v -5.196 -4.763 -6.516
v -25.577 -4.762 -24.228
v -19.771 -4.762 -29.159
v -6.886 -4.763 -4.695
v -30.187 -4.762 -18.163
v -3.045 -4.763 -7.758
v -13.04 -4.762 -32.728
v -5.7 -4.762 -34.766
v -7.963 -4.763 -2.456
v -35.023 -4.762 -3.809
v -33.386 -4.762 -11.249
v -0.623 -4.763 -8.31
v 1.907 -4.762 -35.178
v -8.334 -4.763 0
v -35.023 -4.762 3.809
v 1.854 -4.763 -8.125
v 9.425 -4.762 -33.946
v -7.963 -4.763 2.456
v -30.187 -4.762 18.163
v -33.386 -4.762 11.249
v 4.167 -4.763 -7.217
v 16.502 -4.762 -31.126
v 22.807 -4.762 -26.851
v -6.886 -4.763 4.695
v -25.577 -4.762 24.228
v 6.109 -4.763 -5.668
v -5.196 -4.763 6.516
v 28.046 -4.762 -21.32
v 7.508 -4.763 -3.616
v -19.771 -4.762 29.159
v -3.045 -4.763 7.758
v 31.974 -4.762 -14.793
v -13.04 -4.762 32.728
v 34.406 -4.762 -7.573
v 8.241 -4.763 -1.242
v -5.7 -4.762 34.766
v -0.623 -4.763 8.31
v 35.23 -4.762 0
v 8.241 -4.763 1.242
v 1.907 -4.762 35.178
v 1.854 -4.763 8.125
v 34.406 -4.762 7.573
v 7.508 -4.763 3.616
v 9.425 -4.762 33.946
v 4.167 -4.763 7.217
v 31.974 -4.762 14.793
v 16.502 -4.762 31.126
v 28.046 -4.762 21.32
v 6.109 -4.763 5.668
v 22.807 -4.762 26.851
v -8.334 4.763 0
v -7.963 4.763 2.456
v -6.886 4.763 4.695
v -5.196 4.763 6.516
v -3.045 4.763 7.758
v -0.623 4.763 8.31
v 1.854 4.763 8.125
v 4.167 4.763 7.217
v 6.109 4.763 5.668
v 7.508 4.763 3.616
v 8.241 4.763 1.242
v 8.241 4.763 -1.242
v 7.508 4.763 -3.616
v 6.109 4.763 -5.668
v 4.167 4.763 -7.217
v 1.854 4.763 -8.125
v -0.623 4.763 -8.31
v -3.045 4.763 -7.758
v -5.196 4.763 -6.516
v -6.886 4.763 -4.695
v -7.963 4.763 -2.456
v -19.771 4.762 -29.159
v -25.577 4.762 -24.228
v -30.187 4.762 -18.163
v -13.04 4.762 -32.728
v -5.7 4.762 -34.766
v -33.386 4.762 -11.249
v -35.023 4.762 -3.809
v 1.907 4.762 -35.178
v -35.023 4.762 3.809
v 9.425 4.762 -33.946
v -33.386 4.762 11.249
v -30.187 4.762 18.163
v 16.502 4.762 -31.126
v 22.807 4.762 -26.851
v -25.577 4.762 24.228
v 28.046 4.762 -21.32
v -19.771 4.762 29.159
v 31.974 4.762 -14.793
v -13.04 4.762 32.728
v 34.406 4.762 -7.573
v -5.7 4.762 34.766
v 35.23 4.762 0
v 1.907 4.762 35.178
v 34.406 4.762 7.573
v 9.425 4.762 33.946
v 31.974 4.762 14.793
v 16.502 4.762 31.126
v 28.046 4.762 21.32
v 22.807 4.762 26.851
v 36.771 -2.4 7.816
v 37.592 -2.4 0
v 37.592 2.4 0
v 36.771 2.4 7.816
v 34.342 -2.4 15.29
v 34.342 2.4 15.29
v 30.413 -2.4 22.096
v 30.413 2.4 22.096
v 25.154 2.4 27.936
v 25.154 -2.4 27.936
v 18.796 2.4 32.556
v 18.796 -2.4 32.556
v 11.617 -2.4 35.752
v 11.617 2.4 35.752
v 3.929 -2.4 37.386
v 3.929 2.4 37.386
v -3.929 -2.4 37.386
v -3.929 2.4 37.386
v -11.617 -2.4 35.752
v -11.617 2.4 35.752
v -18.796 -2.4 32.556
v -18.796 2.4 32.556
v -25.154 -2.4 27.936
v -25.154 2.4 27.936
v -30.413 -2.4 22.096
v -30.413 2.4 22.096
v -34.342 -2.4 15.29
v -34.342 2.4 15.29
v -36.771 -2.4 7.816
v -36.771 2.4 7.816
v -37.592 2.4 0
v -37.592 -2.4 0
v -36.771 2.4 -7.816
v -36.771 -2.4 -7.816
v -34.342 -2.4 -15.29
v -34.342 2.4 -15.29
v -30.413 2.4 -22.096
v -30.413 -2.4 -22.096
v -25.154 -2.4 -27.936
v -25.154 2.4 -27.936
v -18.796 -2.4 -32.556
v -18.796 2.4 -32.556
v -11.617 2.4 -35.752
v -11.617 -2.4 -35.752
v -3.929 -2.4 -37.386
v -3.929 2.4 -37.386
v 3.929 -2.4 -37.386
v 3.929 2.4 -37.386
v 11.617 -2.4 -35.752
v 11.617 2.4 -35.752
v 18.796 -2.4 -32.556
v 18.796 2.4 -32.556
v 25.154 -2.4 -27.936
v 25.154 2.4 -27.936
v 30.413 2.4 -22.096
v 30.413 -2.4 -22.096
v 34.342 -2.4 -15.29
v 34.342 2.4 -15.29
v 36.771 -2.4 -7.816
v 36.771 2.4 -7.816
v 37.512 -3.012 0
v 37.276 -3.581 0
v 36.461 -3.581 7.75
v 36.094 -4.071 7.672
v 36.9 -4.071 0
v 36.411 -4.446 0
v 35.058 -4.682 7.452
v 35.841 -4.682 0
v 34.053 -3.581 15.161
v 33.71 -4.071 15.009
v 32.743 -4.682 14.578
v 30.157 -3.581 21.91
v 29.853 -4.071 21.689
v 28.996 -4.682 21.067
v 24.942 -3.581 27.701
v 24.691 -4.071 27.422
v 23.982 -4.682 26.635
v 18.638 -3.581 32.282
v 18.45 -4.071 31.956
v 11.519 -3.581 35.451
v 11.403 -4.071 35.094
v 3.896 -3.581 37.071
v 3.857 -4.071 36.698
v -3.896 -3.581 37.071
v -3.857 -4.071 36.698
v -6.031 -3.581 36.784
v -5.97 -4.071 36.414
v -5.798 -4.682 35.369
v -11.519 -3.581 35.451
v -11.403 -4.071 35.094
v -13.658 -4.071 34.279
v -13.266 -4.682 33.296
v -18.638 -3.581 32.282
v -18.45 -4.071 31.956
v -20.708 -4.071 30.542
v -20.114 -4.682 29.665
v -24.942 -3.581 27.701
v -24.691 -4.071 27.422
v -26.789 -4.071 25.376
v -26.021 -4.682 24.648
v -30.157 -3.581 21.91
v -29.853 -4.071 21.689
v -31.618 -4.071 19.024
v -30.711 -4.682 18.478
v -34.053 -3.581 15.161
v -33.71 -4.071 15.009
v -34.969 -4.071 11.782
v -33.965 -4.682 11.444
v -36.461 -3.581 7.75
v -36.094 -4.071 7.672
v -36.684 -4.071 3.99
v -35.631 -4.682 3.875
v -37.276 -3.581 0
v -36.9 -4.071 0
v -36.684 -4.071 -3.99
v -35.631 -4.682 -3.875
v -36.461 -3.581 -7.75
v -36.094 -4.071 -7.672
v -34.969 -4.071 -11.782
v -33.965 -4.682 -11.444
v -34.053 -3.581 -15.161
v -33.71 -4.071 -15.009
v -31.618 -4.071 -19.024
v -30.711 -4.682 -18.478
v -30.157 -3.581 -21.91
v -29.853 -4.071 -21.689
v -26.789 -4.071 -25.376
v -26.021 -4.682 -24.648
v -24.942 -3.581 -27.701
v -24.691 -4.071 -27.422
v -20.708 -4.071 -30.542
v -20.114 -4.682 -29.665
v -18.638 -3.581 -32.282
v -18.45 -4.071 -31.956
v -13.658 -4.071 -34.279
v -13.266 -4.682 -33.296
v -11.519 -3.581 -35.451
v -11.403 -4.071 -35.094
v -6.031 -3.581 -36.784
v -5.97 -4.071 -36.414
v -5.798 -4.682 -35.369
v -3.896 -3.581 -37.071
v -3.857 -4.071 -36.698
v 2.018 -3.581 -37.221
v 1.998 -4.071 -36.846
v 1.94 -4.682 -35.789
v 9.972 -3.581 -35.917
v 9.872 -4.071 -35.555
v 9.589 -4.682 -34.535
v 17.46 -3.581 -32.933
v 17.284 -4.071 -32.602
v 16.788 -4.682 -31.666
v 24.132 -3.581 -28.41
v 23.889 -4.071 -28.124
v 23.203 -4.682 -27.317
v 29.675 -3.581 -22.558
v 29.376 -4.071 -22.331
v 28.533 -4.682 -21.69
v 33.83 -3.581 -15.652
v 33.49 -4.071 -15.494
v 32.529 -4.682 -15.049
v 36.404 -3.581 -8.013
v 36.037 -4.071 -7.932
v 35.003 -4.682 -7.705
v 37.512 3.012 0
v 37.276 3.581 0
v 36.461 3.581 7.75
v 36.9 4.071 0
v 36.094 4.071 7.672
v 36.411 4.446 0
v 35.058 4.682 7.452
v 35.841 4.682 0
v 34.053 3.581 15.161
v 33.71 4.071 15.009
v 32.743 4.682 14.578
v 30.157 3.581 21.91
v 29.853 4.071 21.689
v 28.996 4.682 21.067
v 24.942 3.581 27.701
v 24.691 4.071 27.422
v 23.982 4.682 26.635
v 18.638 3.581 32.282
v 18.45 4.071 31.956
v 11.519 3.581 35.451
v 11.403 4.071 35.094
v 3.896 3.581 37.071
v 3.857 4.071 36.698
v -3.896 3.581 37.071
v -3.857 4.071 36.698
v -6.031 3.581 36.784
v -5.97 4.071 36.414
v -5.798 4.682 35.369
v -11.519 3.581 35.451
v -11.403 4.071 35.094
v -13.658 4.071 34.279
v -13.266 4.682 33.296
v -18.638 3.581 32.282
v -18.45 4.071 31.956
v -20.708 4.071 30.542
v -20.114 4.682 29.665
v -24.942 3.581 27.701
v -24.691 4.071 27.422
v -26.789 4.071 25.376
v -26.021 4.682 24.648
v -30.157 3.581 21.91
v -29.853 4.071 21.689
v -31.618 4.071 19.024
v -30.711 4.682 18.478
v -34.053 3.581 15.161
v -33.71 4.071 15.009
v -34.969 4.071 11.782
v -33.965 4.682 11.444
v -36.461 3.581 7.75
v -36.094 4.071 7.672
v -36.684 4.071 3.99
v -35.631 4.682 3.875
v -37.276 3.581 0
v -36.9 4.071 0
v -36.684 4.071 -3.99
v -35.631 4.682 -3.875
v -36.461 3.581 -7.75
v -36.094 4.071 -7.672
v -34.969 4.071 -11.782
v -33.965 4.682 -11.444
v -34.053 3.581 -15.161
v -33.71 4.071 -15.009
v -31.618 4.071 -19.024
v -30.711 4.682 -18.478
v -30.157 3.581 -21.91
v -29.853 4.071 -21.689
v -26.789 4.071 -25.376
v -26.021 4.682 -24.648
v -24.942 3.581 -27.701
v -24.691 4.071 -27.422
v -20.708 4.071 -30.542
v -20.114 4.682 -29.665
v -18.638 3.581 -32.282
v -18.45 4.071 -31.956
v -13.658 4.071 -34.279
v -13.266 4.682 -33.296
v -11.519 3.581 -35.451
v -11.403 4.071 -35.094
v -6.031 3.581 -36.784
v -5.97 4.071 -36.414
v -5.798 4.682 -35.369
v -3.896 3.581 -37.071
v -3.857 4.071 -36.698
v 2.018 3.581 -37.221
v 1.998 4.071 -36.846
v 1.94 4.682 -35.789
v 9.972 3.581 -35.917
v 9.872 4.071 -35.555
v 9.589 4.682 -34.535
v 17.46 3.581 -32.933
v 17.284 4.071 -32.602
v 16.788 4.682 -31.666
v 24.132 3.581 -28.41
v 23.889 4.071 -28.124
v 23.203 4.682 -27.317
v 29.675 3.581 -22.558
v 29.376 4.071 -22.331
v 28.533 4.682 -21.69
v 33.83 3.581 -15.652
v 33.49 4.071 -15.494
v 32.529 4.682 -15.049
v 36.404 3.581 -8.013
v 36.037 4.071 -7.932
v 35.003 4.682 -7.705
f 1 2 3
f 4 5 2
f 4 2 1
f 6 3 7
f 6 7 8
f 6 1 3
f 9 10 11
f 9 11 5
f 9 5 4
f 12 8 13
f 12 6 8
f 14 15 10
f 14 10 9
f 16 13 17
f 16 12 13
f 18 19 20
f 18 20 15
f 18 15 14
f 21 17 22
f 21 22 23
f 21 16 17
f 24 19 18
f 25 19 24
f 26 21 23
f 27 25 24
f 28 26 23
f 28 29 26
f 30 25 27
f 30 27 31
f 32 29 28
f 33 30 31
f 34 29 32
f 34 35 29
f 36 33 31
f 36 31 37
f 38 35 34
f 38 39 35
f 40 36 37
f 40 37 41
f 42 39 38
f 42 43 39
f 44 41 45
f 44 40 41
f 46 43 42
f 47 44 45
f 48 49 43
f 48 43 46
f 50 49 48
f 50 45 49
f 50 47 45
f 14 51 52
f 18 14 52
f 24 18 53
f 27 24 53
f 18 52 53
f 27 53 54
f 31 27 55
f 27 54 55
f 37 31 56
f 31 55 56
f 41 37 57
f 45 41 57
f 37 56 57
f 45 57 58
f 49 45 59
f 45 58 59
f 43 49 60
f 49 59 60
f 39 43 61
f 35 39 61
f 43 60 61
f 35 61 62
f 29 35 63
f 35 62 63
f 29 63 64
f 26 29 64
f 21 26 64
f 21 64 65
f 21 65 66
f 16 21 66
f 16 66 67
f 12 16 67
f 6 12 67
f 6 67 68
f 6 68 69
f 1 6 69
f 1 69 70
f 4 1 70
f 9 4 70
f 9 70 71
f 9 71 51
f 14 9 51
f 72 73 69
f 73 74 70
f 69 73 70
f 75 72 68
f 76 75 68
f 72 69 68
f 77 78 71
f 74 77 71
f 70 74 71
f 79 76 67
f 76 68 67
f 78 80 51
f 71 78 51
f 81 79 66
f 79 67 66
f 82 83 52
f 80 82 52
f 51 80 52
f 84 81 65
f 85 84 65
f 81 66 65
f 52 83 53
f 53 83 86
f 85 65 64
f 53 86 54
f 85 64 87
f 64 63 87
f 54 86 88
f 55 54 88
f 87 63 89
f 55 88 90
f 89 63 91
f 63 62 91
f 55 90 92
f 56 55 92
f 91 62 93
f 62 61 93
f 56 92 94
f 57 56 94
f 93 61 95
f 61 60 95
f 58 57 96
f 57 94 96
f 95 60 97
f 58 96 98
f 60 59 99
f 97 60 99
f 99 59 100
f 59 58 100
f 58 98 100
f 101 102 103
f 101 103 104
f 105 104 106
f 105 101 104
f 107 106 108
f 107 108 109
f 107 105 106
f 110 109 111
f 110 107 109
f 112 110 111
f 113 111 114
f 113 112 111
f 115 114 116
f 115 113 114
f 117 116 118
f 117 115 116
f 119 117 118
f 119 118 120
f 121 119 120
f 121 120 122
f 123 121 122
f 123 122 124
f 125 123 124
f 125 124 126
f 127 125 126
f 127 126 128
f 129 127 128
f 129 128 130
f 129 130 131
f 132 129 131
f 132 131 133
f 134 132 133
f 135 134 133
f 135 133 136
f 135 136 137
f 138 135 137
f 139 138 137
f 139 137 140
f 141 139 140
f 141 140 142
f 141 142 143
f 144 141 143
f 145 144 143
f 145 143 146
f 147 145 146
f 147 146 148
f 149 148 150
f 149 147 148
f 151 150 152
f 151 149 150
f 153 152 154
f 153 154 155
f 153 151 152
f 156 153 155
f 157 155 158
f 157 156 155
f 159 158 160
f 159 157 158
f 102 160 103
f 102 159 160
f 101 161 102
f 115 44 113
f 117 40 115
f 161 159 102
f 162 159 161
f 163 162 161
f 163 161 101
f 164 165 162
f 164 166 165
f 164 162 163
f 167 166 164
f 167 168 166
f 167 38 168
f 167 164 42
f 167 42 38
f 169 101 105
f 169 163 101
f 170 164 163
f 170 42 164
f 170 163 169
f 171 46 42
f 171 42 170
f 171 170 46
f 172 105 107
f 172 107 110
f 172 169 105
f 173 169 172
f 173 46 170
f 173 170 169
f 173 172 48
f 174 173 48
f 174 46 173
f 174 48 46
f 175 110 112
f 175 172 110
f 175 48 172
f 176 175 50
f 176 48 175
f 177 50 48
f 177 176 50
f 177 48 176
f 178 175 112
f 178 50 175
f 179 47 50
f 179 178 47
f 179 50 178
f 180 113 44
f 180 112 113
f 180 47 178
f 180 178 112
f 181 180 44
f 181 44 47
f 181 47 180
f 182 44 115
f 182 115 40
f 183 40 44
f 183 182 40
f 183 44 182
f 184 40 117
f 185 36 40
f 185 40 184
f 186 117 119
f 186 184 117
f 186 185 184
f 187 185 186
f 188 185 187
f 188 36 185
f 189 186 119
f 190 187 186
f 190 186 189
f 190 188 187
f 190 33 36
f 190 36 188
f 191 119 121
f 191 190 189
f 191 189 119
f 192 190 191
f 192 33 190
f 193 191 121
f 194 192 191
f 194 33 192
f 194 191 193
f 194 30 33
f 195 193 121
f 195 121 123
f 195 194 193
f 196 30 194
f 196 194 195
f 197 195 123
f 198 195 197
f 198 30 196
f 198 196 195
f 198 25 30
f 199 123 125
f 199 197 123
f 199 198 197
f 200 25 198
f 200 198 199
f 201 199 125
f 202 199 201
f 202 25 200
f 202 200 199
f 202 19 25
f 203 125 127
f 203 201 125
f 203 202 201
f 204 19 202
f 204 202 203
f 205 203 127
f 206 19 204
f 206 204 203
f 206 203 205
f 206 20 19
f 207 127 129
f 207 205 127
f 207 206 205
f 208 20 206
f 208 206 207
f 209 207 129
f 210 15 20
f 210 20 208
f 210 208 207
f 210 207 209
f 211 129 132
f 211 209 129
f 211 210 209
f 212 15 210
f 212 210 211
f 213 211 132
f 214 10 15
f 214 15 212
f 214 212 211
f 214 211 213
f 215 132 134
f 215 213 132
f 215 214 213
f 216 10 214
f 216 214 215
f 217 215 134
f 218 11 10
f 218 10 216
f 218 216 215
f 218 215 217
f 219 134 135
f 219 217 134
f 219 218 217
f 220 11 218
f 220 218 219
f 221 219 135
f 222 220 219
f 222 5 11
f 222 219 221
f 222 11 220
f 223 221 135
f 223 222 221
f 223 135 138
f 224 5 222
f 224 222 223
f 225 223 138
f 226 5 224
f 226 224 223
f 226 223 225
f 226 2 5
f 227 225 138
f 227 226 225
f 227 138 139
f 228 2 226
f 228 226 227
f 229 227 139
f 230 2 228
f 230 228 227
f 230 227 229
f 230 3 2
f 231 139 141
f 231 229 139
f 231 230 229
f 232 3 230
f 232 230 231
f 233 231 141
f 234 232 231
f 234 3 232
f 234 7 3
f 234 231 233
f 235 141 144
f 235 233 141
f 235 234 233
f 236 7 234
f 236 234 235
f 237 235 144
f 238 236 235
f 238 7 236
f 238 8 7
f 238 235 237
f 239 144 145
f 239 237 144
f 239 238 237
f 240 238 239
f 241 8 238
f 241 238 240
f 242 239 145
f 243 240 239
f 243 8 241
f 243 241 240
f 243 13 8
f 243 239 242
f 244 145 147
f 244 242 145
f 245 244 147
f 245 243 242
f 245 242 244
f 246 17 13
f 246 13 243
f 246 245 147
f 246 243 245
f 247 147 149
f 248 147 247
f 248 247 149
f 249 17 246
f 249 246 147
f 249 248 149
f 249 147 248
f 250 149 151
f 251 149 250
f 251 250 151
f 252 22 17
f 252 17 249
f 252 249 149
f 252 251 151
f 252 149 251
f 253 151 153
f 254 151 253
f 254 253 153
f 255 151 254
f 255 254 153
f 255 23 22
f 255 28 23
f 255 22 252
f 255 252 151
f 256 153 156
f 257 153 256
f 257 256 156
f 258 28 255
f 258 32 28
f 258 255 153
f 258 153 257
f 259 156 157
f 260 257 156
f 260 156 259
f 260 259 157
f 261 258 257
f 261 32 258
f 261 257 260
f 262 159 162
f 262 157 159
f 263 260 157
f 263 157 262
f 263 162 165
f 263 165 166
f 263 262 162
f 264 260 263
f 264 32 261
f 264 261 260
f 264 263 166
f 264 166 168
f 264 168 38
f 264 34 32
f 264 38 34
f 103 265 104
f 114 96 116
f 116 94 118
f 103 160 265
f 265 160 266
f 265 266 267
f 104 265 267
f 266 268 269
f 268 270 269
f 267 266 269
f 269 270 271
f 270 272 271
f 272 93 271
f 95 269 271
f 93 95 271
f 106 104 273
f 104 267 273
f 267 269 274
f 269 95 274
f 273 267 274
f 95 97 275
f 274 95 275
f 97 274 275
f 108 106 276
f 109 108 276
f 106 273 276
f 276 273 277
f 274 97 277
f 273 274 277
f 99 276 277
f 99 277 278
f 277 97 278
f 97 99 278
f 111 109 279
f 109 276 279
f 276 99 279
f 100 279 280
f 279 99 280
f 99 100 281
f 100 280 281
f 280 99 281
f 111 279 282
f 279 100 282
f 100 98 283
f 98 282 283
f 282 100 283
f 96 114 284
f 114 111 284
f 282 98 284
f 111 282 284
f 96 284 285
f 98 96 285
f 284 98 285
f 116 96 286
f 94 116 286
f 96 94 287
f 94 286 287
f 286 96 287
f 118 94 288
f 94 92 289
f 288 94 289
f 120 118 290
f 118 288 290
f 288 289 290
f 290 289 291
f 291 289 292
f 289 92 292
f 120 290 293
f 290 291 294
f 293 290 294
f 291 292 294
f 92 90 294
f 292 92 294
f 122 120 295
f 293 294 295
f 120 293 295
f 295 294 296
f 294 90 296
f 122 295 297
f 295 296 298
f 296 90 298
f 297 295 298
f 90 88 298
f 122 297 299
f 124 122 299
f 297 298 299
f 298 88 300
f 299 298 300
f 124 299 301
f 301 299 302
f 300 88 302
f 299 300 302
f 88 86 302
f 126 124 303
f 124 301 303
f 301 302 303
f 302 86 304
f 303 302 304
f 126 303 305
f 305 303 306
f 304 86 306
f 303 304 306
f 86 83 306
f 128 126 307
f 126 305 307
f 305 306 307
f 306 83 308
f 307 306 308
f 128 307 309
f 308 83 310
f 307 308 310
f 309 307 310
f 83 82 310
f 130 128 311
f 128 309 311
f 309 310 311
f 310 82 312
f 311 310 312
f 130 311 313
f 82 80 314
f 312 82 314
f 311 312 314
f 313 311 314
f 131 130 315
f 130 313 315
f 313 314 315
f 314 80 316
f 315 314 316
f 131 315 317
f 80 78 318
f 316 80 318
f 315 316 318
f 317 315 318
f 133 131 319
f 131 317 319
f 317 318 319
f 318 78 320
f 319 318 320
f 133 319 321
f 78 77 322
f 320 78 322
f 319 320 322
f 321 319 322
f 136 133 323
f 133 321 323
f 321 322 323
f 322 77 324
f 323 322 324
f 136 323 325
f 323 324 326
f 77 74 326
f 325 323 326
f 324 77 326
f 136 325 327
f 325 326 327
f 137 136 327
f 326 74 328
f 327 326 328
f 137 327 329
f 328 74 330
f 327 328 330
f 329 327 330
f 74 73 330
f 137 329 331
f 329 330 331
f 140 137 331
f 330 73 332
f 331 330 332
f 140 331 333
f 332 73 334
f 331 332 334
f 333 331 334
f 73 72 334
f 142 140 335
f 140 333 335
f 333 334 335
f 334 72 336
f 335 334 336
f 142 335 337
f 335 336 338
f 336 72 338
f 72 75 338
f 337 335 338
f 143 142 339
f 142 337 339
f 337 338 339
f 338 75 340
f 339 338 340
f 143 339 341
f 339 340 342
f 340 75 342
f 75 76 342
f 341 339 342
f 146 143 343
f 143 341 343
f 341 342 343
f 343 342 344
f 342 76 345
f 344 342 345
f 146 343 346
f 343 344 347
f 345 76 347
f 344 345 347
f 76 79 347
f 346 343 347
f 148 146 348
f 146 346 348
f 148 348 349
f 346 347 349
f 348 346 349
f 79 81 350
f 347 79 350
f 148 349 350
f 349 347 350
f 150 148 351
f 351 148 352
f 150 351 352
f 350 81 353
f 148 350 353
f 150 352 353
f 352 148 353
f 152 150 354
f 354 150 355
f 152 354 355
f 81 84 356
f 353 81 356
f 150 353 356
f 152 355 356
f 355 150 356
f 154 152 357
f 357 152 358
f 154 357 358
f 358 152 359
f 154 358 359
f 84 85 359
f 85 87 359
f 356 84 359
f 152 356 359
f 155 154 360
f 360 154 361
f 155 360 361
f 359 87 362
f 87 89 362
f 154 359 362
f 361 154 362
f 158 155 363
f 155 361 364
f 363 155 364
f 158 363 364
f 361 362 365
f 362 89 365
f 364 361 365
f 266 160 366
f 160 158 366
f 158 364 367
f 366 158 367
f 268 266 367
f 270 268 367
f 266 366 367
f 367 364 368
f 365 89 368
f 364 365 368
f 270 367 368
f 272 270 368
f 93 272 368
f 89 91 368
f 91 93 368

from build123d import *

# Parameters (mm, degrees)
F0_R     = 37.592
F1_DEPTH = 4.7625
F3_D     = 16.66748
F4_R     = 2.3622


with BuildPart() as f1:
    # F0 (on Front) → F1 (new body, symmetric)
    with BuildSketch(Plane.XZ):
        Circle(F0_R)
    extrude(amount=F1_DEPTH, both=True)

    # F3 (through all)
    with Locations(Plane.XZ.offset(4.7625)):
        with Locations((0, 0)):
            Hole(F3_D / 2)

    # F4
    f4_edges = [f1.edges().sort_by_distance(p)[0] for p in [
        (-37.592, -4.7625, 0),
        (-37.592, 4.7625, 0),
    ]]
    fillet(f4_edges, radius=F4_R)


solid = f1.part
